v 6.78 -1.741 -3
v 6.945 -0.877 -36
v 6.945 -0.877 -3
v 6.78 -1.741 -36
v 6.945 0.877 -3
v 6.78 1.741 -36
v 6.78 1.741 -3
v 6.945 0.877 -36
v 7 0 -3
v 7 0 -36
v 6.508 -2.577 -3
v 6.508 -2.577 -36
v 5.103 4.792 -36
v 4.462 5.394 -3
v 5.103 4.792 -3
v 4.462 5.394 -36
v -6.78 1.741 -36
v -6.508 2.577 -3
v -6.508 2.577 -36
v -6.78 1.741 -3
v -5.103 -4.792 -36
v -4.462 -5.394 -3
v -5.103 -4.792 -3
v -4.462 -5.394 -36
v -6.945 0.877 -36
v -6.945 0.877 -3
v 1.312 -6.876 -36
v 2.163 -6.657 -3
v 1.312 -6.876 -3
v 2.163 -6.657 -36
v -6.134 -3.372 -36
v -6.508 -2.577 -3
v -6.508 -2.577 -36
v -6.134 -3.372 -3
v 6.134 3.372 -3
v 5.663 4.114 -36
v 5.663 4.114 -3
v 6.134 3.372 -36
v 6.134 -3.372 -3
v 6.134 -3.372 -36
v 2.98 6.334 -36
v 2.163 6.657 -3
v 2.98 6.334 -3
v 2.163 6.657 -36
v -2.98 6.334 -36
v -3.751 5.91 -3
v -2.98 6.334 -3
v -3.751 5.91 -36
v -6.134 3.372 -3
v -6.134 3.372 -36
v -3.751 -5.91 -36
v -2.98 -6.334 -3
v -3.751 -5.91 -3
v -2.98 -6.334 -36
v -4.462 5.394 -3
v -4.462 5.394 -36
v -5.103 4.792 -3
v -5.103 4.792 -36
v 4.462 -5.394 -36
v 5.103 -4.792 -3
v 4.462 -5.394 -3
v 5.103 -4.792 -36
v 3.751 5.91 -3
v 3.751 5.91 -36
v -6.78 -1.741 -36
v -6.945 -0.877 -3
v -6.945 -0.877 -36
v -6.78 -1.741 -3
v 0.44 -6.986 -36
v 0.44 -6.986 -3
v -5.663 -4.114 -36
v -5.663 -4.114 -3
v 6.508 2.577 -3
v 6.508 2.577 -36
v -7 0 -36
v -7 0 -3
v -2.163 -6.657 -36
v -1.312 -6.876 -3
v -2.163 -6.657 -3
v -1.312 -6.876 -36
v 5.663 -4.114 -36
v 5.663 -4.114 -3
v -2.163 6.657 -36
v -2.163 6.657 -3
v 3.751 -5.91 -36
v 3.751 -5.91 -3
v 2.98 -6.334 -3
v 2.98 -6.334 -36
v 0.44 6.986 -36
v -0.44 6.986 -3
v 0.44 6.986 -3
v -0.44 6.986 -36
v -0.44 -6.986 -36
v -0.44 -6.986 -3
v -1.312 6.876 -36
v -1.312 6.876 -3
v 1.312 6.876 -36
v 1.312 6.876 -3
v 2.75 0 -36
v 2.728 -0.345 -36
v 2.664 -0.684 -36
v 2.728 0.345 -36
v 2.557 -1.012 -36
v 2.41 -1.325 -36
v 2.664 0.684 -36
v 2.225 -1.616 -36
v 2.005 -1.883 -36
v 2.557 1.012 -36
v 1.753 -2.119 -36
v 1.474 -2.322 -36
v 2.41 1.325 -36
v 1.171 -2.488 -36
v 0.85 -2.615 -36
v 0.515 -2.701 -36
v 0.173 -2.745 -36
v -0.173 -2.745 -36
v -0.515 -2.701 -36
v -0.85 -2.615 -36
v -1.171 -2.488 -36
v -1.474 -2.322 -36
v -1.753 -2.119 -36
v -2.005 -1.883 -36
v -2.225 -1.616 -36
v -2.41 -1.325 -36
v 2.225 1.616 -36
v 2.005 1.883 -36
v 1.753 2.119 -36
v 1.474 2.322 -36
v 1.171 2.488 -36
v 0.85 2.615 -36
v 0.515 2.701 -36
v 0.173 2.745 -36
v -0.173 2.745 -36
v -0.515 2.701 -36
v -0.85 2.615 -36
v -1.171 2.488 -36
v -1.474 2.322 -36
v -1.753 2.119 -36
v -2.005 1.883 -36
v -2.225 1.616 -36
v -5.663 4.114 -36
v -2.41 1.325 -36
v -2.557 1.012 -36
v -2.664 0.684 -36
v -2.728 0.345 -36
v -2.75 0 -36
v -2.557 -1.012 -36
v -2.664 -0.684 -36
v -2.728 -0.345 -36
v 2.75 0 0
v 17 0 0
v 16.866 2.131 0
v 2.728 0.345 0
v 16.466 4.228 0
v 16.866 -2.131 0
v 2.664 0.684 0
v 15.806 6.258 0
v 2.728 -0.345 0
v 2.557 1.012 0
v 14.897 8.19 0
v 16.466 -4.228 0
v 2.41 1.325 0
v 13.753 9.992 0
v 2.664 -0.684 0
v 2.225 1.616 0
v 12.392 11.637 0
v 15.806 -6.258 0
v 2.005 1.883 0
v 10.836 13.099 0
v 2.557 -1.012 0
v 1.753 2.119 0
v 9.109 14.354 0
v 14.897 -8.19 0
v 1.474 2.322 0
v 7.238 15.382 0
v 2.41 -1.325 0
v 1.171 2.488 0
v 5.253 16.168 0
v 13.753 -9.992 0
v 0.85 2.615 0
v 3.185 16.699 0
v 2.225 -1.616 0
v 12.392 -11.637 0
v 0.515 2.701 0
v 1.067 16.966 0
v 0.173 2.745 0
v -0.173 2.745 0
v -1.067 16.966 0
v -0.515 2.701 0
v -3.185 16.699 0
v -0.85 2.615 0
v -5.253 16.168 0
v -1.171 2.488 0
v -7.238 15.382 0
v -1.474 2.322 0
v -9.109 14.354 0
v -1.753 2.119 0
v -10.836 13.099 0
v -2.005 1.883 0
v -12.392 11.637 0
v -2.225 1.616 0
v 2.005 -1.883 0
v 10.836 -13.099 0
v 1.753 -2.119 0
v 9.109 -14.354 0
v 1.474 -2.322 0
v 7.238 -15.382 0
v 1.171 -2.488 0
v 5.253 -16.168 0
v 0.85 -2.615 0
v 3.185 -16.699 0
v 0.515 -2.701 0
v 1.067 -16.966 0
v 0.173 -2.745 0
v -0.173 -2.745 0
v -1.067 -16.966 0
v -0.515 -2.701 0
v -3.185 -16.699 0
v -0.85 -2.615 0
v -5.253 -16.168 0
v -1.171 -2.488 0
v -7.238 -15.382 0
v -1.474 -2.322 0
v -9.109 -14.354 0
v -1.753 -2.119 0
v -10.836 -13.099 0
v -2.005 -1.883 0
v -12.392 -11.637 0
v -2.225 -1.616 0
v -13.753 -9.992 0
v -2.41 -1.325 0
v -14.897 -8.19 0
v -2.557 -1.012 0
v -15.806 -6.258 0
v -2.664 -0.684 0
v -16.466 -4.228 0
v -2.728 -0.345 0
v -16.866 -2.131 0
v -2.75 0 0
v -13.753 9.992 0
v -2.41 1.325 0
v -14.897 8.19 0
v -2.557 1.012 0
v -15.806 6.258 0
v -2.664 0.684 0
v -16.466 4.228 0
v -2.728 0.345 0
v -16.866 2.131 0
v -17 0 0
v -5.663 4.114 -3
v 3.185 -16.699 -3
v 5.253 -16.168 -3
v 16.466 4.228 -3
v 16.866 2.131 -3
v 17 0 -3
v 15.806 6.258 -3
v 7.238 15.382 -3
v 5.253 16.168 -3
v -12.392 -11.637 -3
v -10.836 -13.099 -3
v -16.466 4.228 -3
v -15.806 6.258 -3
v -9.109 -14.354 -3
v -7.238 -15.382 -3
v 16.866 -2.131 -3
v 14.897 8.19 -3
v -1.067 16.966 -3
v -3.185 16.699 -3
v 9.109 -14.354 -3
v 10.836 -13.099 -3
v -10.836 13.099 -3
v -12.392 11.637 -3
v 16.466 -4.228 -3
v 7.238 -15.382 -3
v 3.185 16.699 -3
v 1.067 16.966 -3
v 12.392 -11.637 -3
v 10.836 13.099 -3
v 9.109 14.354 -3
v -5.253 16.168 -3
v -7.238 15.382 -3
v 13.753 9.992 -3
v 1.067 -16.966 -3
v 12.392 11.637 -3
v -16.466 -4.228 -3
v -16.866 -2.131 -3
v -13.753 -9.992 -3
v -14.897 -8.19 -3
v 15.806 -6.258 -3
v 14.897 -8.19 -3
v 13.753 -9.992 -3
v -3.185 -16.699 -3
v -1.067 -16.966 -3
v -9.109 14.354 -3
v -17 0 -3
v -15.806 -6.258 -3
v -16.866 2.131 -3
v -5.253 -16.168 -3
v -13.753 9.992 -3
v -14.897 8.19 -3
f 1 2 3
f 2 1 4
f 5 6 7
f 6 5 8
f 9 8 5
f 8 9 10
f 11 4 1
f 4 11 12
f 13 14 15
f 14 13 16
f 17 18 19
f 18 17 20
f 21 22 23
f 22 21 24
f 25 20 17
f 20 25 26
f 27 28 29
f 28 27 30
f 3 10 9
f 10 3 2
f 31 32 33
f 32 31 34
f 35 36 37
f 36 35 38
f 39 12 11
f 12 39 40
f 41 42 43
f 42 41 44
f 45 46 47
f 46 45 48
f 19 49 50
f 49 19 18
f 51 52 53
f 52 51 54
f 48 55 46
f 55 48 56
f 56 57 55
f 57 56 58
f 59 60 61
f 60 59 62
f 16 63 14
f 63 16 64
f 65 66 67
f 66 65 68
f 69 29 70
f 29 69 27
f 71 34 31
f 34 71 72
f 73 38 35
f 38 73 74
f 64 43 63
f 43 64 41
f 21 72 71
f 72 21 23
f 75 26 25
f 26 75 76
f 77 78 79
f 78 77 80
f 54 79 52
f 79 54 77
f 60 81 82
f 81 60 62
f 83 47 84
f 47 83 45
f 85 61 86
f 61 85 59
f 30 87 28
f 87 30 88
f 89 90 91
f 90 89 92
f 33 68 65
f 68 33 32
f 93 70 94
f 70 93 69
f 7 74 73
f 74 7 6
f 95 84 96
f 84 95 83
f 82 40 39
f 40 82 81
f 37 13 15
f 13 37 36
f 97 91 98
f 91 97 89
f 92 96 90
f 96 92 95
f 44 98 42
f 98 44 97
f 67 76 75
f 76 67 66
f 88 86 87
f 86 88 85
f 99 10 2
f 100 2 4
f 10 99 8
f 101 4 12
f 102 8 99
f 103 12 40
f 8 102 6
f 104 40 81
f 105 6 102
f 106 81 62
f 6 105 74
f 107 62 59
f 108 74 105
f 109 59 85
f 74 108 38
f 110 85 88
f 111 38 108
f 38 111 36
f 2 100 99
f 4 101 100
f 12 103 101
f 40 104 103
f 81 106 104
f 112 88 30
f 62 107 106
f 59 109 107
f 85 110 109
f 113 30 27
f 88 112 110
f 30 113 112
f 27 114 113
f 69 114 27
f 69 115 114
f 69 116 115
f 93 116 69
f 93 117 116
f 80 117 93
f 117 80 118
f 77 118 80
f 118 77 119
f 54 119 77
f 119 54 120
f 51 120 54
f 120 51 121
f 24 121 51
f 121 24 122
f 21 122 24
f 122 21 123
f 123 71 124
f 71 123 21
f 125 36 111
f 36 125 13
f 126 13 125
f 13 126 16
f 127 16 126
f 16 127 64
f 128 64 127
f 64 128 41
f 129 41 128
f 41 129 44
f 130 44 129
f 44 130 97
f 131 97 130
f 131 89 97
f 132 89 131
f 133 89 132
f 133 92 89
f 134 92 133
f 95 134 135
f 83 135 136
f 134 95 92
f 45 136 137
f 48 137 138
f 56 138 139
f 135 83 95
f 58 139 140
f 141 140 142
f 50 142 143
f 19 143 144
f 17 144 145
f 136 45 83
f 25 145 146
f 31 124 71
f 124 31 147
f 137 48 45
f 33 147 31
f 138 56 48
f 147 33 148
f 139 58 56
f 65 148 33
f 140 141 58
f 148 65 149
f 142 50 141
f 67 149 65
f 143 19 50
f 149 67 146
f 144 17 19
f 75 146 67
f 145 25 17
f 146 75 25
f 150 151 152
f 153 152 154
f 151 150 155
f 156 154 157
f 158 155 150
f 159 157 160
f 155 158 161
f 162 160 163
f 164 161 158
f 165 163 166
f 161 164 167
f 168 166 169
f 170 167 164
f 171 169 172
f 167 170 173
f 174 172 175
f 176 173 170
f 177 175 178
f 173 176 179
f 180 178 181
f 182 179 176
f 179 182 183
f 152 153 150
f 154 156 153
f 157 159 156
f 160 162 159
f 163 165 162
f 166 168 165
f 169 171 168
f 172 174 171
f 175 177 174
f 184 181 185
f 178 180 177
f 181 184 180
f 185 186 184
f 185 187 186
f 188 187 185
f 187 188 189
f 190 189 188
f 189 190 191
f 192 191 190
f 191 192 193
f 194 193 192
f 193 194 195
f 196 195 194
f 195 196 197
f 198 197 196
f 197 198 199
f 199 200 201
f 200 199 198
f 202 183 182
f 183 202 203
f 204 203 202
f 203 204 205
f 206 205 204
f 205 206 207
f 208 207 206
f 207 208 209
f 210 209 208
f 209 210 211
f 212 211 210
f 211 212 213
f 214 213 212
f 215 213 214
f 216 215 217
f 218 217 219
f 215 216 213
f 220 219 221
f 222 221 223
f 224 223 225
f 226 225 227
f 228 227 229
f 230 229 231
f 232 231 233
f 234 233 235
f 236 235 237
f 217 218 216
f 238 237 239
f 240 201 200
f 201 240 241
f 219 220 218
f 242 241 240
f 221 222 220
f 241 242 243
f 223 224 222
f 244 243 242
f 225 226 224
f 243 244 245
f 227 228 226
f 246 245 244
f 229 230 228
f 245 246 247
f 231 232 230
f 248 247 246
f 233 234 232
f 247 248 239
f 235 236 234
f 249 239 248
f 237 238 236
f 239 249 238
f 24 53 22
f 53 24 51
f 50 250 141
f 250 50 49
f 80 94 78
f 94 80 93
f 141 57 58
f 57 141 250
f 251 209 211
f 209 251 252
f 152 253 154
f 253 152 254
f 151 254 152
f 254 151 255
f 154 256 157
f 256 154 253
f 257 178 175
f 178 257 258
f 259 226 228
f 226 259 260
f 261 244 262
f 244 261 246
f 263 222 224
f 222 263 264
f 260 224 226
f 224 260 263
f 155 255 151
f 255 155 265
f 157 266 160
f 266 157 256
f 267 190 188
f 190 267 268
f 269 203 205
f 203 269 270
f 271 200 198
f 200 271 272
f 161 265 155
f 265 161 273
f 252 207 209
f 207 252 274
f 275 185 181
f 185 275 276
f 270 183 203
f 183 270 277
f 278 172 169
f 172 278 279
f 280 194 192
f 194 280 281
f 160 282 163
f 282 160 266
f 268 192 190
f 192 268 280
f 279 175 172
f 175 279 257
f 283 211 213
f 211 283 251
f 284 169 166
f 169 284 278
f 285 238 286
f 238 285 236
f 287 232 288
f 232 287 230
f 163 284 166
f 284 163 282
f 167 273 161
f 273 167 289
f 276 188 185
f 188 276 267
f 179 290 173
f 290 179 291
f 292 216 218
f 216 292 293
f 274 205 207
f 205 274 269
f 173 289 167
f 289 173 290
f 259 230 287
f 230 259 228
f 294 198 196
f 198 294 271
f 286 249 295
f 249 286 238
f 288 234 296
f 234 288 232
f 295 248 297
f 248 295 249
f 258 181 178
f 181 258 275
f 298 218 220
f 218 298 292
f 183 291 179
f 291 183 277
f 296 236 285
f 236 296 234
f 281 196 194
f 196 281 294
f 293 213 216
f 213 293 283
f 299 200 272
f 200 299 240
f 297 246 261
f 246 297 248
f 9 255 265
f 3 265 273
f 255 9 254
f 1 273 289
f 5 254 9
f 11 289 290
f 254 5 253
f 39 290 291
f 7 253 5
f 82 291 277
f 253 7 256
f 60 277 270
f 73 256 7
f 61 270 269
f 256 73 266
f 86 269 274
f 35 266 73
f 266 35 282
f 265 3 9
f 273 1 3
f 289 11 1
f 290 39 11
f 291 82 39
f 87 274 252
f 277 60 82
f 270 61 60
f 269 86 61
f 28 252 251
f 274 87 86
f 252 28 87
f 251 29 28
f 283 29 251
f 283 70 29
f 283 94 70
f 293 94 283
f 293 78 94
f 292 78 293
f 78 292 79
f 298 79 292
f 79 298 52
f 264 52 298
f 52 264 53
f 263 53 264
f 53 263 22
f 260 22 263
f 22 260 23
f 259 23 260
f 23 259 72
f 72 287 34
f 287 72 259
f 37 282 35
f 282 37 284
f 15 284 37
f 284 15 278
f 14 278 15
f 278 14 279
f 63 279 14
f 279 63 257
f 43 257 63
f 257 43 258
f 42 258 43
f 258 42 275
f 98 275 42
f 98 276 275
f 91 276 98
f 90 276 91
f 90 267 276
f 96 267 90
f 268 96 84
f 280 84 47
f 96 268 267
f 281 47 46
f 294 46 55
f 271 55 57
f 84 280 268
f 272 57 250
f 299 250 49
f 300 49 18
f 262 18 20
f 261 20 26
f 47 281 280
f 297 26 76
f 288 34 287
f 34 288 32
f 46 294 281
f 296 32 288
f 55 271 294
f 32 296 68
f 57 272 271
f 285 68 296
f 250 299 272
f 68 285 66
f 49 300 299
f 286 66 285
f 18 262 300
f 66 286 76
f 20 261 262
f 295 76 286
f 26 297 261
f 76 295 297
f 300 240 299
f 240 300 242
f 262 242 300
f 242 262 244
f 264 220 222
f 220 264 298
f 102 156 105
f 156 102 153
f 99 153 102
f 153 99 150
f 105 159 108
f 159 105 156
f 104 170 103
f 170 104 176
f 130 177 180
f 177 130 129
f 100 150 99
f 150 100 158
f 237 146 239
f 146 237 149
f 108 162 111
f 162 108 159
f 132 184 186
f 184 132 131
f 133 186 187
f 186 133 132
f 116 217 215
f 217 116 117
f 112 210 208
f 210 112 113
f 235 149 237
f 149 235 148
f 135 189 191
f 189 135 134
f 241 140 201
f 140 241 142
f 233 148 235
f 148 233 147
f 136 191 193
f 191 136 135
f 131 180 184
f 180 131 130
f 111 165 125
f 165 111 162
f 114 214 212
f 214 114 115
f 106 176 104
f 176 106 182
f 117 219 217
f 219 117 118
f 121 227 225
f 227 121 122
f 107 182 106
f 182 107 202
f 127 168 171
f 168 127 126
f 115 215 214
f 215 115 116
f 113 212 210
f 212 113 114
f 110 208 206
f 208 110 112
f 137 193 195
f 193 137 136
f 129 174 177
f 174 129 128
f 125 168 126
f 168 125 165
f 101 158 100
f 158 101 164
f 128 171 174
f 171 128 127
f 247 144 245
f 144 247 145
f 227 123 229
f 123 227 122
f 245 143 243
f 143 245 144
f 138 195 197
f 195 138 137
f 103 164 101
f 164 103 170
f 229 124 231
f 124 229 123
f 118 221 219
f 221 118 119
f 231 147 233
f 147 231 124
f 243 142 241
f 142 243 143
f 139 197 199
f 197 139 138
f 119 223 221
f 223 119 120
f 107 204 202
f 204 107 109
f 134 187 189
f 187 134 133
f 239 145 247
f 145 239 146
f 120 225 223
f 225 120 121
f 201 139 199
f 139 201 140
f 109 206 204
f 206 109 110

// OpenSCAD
$fn = 50;


difference() {
	union() {
		translate(v = [0, 0, -36.0000000000]) {
			cylinder(h = 36, r = 7.0000000000);
		}
		translate(v = [0, 0, -3.0000000000]) {
			cylinder(h = 3, r = 17.0000000000);
		}
	}
	union() {
		#translate(v = [0, 0, -36]) {
			cylinder(h = 36, r = 2.7500000000);
		}
	}
}
